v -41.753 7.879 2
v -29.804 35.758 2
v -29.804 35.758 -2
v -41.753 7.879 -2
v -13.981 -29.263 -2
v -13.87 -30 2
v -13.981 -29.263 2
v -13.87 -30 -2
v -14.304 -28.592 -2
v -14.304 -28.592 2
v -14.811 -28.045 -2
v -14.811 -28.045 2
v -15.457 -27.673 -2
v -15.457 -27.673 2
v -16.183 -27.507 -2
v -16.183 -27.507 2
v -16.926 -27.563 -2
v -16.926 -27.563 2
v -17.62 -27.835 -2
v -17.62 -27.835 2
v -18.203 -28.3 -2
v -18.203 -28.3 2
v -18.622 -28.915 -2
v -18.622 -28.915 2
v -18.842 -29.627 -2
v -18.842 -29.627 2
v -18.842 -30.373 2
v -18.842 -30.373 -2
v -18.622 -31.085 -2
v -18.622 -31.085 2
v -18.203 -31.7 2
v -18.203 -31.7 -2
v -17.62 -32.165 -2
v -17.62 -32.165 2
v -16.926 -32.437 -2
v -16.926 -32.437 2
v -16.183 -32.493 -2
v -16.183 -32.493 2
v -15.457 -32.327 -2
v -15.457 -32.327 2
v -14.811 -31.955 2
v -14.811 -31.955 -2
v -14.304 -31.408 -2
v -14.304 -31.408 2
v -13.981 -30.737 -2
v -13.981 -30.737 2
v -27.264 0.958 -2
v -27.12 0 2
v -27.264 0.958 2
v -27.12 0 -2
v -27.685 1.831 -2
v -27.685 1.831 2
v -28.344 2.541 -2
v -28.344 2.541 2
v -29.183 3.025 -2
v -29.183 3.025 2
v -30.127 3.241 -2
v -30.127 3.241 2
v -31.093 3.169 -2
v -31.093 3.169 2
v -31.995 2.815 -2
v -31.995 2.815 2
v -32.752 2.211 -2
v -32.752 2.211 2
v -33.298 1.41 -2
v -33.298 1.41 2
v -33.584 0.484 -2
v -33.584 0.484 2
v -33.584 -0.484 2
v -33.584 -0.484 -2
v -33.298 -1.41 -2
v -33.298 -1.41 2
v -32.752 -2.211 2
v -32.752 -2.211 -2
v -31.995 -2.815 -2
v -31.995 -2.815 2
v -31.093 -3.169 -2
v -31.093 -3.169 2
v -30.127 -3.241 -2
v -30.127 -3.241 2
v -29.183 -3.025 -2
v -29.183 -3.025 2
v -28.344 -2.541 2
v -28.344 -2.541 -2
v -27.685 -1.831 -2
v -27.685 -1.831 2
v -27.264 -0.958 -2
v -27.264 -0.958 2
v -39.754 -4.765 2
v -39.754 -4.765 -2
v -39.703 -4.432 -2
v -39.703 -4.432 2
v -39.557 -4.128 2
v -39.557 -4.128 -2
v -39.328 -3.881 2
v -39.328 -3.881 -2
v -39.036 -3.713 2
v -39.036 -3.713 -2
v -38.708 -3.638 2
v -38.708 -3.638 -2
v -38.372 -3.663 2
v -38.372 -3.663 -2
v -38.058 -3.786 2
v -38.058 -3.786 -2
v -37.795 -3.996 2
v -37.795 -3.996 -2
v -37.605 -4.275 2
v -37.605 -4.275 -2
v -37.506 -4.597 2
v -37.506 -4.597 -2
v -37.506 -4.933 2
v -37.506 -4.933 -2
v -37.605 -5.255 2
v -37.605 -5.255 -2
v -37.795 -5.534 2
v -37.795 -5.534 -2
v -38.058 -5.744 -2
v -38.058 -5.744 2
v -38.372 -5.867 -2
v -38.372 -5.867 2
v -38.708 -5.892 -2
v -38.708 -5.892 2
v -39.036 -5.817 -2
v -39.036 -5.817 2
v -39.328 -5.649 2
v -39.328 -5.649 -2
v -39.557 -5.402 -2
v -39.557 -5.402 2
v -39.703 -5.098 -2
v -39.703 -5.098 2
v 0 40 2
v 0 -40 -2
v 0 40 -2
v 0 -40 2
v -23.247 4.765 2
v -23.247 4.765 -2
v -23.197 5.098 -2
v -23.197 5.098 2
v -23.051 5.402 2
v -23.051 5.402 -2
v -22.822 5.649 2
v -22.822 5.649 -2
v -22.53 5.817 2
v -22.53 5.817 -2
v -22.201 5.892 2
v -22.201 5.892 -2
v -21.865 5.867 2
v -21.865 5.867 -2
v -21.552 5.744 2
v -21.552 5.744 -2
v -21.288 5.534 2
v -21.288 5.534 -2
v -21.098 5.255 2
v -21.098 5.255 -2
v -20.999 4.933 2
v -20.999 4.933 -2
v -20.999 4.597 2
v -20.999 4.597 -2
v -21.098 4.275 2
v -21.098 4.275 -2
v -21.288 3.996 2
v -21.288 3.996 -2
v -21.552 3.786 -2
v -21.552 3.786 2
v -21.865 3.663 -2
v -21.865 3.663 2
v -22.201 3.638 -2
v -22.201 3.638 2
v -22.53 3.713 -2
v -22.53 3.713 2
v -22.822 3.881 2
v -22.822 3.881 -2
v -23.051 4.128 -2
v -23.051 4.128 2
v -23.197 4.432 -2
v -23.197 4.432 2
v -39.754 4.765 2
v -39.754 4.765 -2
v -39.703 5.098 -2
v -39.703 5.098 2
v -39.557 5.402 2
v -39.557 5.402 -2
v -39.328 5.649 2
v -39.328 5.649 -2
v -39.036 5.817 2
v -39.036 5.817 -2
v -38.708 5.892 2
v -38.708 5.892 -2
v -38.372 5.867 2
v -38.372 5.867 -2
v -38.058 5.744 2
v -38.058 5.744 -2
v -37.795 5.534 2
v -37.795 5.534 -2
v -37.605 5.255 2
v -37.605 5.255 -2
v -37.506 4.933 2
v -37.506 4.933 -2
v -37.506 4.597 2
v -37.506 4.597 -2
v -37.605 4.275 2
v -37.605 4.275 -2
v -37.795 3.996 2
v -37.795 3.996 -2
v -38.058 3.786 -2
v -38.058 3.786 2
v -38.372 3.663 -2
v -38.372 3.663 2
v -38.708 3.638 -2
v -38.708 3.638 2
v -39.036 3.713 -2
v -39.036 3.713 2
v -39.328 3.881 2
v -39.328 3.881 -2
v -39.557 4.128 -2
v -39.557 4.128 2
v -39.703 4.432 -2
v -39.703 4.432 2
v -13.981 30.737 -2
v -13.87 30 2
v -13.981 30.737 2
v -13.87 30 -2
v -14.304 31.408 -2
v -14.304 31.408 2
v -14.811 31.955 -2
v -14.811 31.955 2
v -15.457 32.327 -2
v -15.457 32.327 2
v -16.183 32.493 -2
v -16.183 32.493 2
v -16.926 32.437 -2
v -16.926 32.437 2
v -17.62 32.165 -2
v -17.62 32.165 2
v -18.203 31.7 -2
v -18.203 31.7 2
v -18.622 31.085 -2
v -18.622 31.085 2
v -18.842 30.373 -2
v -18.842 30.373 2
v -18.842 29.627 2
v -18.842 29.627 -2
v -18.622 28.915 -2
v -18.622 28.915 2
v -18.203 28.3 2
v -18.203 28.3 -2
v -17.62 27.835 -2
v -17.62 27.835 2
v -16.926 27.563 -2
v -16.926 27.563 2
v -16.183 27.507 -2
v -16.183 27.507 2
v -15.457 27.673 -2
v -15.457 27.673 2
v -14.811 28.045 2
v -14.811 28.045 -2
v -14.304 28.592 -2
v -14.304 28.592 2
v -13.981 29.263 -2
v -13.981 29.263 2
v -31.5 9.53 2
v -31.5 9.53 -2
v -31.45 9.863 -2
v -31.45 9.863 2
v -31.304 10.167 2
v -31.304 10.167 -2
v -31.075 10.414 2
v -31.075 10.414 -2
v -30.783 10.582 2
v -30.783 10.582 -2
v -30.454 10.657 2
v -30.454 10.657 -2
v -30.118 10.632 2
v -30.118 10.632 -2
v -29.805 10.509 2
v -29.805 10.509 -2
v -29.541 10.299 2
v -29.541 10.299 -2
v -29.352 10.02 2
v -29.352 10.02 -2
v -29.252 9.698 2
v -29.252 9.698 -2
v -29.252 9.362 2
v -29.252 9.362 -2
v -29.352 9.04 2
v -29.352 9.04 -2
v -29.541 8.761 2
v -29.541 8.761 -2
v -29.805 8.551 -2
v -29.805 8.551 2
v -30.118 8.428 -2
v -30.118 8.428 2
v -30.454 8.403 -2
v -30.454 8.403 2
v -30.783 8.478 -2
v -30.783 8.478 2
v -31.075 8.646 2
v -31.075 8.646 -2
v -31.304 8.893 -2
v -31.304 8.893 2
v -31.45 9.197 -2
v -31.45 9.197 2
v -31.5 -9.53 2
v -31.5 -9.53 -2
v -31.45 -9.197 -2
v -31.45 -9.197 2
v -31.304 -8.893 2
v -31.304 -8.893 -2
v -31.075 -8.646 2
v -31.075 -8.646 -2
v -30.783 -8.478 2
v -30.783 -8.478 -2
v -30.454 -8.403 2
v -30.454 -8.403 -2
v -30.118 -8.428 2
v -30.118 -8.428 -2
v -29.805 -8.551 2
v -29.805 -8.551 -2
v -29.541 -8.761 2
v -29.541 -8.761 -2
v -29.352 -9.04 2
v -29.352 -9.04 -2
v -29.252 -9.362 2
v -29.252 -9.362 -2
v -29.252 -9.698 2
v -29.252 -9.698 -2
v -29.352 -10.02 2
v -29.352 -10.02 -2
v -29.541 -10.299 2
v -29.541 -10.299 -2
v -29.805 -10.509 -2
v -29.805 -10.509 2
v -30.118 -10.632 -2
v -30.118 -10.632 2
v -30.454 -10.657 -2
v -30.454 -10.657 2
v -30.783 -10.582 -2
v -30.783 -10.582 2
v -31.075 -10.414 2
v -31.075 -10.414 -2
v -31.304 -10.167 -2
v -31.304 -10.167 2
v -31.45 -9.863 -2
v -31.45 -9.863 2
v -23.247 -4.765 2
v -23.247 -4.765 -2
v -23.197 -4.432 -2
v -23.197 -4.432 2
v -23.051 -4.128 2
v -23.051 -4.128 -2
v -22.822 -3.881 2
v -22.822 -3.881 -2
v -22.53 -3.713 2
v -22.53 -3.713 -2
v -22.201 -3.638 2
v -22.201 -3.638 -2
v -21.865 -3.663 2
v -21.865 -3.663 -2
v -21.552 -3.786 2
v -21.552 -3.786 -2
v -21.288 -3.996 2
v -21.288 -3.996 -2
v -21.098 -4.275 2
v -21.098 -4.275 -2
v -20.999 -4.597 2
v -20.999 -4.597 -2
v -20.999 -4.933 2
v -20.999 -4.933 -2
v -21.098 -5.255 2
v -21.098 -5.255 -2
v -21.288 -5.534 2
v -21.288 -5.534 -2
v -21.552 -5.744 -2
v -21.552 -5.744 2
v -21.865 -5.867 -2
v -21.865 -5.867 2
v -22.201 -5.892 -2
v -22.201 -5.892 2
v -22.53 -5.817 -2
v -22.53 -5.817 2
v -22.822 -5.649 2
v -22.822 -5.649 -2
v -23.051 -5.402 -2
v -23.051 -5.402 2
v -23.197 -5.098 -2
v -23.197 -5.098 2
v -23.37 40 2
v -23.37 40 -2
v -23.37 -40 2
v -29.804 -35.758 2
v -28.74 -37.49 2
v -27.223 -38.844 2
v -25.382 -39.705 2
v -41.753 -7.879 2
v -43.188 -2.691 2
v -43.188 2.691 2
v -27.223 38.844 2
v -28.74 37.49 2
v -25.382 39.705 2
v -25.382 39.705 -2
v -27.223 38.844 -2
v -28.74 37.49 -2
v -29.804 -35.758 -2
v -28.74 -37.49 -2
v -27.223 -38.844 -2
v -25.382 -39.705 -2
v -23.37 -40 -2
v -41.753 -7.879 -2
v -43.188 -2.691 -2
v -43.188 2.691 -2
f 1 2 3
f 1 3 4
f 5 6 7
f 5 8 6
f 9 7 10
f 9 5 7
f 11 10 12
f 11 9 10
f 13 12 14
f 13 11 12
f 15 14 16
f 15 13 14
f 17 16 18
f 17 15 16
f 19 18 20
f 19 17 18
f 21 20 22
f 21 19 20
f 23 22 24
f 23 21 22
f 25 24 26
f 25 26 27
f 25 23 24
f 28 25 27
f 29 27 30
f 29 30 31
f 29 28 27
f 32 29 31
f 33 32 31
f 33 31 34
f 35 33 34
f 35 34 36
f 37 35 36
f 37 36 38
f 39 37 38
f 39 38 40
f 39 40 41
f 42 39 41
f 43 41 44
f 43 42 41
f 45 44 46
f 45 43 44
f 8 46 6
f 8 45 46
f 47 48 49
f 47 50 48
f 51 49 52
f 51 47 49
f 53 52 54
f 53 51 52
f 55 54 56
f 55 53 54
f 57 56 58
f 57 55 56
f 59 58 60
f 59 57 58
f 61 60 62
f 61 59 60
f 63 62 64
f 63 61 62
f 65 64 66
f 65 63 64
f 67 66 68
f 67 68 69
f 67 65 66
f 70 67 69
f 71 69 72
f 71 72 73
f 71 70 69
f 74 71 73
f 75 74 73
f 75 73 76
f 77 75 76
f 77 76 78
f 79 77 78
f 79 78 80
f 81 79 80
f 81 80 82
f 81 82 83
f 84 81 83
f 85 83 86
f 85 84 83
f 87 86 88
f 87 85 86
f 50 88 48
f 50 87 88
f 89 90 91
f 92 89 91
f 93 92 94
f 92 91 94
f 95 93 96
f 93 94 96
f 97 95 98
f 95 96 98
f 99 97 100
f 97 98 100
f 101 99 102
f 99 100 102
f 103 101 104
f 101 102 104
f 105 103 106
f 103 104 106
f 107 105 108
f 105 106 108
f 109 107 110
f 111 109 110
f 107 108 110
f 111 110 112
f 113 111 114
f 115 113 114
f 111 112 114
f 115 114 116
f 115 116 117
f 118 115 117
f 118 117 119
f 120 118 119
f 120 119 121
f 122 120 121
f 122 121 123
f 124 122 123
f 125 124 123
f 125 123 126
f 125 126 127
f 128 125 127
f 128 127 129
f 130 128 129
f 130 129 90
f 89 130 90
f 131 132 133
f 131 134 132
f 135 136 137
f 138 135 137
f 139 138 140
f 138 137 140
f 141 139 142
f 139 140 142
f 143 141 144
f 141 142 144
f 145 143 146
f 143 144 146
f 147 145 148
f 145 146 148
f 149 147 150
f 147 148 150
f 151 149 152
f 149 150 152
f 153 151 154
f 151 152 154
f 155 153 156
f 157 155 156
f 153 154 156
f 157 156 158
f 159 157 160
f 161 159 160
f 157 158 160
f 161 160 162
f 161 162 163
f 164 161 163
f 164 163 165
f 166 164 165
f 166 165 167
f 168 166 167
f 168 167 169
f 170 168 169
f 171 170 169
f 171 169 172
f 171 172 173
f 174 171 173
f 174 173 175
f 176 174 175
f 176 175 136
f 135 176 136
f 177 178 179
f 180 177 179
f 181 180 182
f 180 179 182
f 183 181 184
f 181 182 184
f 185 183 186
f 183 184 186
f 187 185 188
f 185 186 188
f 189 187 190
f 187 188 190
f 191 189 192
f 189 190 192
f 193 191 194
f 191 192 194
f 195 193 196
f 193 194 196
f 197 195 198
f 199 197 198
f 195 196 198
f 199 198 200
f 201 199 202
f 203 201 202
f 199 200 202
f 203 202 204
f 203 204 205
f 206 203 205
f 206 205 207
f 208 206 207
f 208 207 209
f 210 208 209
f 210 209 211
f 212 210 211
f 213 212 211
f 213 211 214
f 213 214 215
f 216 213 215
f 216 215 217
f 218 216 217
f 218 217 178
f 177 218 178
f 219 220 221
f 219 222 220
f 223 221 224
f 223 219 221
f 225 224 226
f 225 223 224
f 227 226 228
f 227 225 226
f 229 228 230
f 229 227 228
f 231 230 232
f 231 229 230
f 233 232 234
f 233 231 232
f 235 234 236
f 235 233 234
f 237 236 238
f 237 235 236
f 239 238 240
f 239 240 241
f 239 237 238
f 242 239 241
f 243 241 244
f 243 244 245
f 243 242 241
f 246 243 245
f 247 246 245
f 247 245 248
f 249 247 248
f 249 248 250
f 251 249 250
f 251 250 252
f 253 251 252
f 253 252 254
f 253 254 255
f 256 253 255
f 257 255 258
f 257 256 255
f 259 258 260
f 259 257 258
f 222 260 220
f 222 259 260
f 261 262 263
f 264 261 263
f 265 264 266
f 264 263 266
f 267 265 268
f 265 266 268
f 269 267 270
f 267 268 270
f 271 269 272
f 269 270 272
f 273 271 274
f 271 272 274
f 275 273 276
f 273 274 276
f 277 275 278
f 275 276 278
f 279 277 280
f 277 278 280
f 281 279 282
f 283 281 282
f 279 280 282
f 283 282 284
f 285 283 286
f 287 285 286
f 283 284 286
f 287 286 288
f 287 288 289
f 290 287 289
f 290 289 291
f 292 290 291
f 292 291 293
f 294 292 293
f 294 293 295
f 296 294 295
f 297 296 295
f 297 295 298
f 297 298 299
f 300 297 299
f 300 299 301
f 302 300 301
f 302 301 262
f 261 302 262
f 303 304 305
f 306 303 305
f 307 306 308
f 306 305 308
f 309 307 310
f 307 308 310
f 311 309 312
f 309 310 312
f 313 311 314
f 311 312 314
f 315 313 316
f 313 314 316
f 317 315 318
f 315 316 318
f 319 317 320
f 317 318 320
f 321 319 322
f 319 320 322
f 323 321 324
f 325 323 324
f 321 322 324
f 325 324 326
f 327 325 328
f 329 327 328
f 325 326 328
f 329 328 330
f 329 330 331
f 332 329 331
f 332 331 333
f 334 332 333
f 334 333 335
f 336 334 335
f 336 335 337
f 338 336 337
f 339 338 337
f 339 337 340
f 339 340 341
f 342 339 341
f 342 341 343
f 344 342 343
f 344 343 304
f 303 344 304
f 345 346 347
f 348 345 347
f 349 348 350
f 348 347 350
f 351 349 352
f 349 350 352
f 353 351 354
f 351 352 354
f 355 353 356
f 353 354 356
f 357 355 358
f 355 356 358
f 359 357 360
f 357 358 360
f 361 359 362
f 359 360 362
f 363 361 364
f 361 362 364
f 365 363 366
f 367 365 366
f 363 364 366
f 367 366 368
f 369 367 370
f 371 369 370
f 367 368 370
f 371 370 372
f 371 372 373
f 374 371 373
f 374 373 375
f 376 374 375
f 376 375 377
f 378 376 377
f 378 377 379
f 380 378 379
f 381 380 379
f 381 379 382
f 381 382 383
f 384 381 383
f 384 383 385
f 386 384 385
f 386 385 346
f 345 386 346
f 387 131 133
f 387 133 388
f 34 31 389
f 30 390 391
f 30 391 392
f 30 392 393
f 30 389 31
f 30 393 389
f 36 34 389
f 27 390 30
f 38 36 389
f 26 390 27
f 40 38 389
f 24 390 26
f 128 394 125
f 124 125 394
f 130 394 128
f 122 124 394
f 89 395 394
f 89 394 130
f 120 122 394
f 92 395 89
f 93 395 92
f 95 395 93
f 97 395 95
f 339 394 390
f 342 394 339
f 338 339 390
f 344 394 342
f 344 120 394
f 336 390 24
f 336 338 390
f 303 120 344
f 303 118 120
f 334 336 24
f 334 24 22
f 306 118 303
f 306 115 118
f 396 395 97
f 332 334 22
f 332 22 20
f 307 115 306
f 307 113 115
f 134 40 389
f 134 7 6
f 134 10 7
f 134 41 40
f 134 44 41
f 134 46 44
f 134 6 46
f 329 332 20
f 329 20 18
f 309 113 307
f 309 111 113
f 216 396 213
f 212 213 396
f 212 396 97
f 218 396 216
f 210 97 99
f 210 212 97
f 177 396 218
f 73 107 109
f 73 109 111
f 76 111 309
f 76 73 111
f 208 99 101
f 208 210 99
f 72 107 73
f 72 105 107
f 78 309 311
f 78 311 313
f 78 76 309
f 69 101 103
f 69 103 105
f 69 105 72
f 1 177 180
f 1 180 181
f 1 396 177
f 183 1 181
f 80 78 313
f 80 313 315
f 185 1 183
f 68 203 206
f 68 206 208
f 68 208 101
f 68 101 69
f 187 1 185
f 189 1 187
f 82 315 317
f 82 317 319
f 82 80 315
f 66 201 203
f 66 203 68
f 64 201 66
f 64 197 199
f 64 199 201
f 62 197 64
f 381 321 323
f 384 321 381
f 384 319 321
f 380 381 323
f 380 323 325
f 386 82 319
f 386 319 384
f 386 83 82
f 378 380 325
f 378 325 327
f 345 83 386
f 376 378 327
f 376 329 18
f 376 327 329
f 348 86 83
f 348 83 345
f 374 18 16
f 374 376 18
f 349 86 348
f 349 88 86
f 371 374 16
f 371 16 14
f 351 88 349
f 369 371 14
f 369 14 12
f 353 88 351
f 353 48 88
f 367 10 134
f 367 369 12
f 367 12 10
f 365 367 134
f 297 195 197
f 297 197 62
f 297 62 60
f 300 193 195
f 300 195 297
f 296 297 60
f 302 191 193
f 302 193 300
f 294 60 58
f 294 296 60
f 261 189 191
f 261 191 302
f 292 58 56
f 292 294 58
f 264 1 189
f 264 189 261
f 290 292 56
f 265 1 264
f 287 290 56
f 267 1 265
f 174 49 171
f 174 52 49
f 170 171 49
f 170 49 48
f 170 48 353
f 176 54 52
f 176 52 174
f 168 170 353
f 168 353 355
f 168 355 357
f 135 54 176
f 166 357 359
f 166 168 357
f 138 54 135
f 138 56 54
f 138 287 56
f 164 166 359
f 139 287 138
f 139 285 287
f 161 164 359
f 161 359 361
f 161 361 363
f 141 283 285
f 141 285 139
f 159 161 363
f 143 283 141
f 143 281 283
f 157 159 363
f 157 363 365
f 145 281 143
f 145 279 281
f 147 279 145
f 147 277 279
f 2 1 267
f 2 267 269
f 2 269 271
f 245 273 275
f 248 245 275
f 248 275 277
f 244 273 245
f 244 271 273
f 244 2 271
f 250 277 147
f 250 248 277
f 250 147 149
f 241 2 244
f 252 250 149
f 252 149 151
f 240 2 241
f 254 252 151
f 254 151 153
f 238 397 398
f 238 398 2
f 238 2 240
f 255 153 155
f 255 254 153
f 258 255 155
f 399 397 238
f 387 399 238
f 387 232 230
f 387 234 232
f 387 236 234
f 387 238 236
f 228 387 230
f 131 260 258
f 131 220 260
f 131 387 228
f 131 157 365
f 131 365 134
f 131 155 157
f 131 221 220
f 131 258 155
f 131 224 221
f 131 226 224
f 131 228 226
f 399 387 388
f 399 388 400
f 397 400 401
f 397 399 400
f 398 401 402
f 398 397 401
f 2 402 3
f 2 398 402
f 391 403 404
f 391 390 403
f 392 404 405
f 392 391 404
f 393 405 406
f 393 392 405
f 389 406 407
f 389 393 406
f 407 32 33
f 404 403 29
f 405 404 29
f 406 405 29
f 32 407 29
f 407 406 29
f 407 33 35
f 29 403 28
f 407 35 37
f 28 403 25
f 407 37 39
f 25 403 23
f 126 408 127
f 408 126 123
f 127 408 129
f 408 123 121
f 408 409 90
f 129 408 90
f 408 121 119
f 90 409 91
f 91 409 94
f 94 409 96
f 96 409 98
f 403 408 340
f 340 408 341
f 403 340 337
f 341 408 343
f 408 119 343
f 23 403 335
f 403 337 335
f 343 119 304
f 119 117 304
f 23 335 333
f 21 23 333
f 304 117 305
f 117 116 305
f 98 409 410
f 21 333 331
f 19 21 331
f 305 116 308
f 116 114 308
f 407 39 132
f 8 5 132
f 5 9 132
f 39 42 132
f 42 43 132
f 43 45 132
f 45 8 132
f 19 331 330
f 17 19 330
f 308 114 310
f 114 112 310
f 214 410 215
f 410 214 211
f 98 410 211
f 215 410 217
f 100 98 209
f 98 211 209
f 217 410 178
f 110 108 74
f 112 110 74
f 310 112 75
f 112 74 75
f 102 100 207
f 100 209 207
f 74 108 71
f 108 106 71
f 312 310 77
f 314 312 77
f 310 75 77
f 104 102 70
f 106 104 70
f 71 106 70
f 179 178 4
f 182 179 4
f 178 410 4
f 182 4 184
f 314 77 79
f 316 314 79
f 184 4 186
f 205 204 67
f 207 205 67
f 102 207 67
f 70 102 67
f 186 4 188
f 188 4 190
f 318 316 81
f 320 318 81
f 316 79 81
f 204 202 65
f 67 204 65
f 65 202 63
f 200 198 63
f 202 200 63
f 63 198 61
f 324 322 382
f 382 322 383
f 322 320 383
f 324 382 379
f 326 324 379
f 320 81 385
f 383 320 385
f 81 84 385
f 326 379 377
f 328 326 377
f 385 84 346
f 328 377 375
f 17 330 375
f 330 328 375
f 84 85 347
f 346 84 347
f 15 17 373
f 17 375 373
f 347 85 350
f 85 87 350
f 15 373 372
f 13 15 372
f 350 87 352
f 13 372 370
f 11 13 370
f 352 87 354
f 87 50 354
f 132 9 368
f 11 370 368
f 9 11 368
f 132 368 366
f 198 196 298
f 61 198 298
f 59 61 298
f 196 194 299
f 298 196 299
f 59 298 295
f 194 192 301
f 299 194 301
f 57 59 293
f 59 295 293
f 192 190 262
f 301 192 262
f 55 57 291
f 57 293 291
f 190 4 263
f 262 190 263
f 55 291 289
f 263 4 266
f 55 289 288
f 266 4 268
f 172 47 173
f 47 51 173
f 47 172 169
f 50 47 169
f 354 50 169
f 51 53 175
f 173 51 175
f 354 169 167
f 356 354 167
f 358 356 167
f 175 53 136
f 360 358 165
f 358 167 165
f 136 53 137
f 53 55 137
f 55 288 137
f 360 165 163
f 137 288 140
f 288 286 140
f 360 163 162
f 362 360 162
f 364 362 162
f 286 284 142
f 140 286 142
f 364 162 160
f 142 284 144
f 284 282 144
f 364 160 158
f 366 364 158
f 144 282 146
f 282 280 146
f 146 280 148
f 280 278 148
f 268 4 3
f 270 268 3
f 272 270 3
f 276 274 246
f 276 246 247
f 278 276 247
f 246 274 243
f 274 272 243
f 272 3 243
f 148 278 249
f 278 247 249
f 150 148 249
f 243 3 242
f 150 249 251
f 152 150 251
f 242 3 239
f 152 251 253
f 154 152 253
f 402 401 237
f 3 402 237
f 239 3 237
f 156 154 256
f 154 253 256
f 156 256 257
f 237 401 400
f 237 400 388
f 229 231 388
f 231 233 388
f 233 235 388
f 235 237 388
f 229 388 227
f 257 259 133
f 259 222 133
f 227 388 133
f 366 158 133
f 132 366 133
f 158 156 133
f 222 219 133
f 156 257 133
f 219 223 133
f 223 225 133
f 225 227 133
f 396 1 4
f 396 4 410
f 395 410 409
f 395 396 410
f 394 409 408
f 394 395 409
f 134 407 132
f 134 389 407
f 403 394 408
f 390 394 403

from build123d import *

# Parameters (mm, degrees)
SKETCH1_R                   = 2.5
SKETCH1_R_2                 = 3.25
BOSS_EXTRUDE1_DEPTH         = 2
TALADRO_ROSCADO_4_401_D     = 2.2606
TALADRO_ROSCADO_4_401_DEPTH = 12.7
TALADRO_ROSCADO_4_401_TIP   = 0.679152758


with BuildPart() as part:
    # Sketch1 → Boss-Extrude1 (new, symmetric)
    with BuildSketch(Plane.XY):
        with BuildLine():
            Line((0, -40), (0, 40))
            Line((0, 40), (-23.37, 40))
            ThreePointArc((-23.37, 40), (-27.223373178, 38.84392977), (-29.803954922, 35.757575758))
            Line((-29.803954922, 35.757575758), (-41.752728349, 7.878787879))
            ThreePointArc((-41.752728349, 7.878787879), (-43.37, 0), (-41.752728349, -7.878787879))
            Line((-41.752728349, -7.878787879), (-29.803954922, -35.757575758))
            ThreePointArc((-29.803954922, -35.757575758), (-27.223373178, -38.84392977), (-23.37, -40))
            Line((-23.37, -40), (0, -40))
        make_face()
        with Locations((-16.37, 30)):
            Circle(SKETCH1_R, mode=Mode.SUBTRACT)
        with Locations((-16.37, -30)):
            Circle(SKETCH1_R, mode=Mode.SUBTRACT)
        with Locations((-30.37, 0)):
            Circle(SKETCH1_R_2, mode=Mode.SUBTRACT)
    extrude(amount=BOSS_EXTRUDE1_DEPTH, both=True)

    # Taladro roscado #4-401
    with Locations(Plane.XY.offset(2)):
        with Locations((-30.37, -9.53), (-38.623222098, -4.765), (-38.623222098, 4.765), (-30.37, 9.53), (-22.116777902, 4.765), (-22.116777902, -4.765)):
            Hole(TALADRO_ROSCADO_4_401_D / 2, depth=TALADRO_ROSCADO_4_401_DEPTH)
            with Locations((0, 0, -(TALADRO_ROSCADO_4_401_DEPTH + TALADRO_ROSCADO_4_401_TIP / 2))):  # 118° drill point
                Cone(0, TALADRO_ROSCADO_4_401_D / 2, TALADRO_ROSCADO_4_401_TIP, mode=Mode.SUBTRACT)


solid = part.part
